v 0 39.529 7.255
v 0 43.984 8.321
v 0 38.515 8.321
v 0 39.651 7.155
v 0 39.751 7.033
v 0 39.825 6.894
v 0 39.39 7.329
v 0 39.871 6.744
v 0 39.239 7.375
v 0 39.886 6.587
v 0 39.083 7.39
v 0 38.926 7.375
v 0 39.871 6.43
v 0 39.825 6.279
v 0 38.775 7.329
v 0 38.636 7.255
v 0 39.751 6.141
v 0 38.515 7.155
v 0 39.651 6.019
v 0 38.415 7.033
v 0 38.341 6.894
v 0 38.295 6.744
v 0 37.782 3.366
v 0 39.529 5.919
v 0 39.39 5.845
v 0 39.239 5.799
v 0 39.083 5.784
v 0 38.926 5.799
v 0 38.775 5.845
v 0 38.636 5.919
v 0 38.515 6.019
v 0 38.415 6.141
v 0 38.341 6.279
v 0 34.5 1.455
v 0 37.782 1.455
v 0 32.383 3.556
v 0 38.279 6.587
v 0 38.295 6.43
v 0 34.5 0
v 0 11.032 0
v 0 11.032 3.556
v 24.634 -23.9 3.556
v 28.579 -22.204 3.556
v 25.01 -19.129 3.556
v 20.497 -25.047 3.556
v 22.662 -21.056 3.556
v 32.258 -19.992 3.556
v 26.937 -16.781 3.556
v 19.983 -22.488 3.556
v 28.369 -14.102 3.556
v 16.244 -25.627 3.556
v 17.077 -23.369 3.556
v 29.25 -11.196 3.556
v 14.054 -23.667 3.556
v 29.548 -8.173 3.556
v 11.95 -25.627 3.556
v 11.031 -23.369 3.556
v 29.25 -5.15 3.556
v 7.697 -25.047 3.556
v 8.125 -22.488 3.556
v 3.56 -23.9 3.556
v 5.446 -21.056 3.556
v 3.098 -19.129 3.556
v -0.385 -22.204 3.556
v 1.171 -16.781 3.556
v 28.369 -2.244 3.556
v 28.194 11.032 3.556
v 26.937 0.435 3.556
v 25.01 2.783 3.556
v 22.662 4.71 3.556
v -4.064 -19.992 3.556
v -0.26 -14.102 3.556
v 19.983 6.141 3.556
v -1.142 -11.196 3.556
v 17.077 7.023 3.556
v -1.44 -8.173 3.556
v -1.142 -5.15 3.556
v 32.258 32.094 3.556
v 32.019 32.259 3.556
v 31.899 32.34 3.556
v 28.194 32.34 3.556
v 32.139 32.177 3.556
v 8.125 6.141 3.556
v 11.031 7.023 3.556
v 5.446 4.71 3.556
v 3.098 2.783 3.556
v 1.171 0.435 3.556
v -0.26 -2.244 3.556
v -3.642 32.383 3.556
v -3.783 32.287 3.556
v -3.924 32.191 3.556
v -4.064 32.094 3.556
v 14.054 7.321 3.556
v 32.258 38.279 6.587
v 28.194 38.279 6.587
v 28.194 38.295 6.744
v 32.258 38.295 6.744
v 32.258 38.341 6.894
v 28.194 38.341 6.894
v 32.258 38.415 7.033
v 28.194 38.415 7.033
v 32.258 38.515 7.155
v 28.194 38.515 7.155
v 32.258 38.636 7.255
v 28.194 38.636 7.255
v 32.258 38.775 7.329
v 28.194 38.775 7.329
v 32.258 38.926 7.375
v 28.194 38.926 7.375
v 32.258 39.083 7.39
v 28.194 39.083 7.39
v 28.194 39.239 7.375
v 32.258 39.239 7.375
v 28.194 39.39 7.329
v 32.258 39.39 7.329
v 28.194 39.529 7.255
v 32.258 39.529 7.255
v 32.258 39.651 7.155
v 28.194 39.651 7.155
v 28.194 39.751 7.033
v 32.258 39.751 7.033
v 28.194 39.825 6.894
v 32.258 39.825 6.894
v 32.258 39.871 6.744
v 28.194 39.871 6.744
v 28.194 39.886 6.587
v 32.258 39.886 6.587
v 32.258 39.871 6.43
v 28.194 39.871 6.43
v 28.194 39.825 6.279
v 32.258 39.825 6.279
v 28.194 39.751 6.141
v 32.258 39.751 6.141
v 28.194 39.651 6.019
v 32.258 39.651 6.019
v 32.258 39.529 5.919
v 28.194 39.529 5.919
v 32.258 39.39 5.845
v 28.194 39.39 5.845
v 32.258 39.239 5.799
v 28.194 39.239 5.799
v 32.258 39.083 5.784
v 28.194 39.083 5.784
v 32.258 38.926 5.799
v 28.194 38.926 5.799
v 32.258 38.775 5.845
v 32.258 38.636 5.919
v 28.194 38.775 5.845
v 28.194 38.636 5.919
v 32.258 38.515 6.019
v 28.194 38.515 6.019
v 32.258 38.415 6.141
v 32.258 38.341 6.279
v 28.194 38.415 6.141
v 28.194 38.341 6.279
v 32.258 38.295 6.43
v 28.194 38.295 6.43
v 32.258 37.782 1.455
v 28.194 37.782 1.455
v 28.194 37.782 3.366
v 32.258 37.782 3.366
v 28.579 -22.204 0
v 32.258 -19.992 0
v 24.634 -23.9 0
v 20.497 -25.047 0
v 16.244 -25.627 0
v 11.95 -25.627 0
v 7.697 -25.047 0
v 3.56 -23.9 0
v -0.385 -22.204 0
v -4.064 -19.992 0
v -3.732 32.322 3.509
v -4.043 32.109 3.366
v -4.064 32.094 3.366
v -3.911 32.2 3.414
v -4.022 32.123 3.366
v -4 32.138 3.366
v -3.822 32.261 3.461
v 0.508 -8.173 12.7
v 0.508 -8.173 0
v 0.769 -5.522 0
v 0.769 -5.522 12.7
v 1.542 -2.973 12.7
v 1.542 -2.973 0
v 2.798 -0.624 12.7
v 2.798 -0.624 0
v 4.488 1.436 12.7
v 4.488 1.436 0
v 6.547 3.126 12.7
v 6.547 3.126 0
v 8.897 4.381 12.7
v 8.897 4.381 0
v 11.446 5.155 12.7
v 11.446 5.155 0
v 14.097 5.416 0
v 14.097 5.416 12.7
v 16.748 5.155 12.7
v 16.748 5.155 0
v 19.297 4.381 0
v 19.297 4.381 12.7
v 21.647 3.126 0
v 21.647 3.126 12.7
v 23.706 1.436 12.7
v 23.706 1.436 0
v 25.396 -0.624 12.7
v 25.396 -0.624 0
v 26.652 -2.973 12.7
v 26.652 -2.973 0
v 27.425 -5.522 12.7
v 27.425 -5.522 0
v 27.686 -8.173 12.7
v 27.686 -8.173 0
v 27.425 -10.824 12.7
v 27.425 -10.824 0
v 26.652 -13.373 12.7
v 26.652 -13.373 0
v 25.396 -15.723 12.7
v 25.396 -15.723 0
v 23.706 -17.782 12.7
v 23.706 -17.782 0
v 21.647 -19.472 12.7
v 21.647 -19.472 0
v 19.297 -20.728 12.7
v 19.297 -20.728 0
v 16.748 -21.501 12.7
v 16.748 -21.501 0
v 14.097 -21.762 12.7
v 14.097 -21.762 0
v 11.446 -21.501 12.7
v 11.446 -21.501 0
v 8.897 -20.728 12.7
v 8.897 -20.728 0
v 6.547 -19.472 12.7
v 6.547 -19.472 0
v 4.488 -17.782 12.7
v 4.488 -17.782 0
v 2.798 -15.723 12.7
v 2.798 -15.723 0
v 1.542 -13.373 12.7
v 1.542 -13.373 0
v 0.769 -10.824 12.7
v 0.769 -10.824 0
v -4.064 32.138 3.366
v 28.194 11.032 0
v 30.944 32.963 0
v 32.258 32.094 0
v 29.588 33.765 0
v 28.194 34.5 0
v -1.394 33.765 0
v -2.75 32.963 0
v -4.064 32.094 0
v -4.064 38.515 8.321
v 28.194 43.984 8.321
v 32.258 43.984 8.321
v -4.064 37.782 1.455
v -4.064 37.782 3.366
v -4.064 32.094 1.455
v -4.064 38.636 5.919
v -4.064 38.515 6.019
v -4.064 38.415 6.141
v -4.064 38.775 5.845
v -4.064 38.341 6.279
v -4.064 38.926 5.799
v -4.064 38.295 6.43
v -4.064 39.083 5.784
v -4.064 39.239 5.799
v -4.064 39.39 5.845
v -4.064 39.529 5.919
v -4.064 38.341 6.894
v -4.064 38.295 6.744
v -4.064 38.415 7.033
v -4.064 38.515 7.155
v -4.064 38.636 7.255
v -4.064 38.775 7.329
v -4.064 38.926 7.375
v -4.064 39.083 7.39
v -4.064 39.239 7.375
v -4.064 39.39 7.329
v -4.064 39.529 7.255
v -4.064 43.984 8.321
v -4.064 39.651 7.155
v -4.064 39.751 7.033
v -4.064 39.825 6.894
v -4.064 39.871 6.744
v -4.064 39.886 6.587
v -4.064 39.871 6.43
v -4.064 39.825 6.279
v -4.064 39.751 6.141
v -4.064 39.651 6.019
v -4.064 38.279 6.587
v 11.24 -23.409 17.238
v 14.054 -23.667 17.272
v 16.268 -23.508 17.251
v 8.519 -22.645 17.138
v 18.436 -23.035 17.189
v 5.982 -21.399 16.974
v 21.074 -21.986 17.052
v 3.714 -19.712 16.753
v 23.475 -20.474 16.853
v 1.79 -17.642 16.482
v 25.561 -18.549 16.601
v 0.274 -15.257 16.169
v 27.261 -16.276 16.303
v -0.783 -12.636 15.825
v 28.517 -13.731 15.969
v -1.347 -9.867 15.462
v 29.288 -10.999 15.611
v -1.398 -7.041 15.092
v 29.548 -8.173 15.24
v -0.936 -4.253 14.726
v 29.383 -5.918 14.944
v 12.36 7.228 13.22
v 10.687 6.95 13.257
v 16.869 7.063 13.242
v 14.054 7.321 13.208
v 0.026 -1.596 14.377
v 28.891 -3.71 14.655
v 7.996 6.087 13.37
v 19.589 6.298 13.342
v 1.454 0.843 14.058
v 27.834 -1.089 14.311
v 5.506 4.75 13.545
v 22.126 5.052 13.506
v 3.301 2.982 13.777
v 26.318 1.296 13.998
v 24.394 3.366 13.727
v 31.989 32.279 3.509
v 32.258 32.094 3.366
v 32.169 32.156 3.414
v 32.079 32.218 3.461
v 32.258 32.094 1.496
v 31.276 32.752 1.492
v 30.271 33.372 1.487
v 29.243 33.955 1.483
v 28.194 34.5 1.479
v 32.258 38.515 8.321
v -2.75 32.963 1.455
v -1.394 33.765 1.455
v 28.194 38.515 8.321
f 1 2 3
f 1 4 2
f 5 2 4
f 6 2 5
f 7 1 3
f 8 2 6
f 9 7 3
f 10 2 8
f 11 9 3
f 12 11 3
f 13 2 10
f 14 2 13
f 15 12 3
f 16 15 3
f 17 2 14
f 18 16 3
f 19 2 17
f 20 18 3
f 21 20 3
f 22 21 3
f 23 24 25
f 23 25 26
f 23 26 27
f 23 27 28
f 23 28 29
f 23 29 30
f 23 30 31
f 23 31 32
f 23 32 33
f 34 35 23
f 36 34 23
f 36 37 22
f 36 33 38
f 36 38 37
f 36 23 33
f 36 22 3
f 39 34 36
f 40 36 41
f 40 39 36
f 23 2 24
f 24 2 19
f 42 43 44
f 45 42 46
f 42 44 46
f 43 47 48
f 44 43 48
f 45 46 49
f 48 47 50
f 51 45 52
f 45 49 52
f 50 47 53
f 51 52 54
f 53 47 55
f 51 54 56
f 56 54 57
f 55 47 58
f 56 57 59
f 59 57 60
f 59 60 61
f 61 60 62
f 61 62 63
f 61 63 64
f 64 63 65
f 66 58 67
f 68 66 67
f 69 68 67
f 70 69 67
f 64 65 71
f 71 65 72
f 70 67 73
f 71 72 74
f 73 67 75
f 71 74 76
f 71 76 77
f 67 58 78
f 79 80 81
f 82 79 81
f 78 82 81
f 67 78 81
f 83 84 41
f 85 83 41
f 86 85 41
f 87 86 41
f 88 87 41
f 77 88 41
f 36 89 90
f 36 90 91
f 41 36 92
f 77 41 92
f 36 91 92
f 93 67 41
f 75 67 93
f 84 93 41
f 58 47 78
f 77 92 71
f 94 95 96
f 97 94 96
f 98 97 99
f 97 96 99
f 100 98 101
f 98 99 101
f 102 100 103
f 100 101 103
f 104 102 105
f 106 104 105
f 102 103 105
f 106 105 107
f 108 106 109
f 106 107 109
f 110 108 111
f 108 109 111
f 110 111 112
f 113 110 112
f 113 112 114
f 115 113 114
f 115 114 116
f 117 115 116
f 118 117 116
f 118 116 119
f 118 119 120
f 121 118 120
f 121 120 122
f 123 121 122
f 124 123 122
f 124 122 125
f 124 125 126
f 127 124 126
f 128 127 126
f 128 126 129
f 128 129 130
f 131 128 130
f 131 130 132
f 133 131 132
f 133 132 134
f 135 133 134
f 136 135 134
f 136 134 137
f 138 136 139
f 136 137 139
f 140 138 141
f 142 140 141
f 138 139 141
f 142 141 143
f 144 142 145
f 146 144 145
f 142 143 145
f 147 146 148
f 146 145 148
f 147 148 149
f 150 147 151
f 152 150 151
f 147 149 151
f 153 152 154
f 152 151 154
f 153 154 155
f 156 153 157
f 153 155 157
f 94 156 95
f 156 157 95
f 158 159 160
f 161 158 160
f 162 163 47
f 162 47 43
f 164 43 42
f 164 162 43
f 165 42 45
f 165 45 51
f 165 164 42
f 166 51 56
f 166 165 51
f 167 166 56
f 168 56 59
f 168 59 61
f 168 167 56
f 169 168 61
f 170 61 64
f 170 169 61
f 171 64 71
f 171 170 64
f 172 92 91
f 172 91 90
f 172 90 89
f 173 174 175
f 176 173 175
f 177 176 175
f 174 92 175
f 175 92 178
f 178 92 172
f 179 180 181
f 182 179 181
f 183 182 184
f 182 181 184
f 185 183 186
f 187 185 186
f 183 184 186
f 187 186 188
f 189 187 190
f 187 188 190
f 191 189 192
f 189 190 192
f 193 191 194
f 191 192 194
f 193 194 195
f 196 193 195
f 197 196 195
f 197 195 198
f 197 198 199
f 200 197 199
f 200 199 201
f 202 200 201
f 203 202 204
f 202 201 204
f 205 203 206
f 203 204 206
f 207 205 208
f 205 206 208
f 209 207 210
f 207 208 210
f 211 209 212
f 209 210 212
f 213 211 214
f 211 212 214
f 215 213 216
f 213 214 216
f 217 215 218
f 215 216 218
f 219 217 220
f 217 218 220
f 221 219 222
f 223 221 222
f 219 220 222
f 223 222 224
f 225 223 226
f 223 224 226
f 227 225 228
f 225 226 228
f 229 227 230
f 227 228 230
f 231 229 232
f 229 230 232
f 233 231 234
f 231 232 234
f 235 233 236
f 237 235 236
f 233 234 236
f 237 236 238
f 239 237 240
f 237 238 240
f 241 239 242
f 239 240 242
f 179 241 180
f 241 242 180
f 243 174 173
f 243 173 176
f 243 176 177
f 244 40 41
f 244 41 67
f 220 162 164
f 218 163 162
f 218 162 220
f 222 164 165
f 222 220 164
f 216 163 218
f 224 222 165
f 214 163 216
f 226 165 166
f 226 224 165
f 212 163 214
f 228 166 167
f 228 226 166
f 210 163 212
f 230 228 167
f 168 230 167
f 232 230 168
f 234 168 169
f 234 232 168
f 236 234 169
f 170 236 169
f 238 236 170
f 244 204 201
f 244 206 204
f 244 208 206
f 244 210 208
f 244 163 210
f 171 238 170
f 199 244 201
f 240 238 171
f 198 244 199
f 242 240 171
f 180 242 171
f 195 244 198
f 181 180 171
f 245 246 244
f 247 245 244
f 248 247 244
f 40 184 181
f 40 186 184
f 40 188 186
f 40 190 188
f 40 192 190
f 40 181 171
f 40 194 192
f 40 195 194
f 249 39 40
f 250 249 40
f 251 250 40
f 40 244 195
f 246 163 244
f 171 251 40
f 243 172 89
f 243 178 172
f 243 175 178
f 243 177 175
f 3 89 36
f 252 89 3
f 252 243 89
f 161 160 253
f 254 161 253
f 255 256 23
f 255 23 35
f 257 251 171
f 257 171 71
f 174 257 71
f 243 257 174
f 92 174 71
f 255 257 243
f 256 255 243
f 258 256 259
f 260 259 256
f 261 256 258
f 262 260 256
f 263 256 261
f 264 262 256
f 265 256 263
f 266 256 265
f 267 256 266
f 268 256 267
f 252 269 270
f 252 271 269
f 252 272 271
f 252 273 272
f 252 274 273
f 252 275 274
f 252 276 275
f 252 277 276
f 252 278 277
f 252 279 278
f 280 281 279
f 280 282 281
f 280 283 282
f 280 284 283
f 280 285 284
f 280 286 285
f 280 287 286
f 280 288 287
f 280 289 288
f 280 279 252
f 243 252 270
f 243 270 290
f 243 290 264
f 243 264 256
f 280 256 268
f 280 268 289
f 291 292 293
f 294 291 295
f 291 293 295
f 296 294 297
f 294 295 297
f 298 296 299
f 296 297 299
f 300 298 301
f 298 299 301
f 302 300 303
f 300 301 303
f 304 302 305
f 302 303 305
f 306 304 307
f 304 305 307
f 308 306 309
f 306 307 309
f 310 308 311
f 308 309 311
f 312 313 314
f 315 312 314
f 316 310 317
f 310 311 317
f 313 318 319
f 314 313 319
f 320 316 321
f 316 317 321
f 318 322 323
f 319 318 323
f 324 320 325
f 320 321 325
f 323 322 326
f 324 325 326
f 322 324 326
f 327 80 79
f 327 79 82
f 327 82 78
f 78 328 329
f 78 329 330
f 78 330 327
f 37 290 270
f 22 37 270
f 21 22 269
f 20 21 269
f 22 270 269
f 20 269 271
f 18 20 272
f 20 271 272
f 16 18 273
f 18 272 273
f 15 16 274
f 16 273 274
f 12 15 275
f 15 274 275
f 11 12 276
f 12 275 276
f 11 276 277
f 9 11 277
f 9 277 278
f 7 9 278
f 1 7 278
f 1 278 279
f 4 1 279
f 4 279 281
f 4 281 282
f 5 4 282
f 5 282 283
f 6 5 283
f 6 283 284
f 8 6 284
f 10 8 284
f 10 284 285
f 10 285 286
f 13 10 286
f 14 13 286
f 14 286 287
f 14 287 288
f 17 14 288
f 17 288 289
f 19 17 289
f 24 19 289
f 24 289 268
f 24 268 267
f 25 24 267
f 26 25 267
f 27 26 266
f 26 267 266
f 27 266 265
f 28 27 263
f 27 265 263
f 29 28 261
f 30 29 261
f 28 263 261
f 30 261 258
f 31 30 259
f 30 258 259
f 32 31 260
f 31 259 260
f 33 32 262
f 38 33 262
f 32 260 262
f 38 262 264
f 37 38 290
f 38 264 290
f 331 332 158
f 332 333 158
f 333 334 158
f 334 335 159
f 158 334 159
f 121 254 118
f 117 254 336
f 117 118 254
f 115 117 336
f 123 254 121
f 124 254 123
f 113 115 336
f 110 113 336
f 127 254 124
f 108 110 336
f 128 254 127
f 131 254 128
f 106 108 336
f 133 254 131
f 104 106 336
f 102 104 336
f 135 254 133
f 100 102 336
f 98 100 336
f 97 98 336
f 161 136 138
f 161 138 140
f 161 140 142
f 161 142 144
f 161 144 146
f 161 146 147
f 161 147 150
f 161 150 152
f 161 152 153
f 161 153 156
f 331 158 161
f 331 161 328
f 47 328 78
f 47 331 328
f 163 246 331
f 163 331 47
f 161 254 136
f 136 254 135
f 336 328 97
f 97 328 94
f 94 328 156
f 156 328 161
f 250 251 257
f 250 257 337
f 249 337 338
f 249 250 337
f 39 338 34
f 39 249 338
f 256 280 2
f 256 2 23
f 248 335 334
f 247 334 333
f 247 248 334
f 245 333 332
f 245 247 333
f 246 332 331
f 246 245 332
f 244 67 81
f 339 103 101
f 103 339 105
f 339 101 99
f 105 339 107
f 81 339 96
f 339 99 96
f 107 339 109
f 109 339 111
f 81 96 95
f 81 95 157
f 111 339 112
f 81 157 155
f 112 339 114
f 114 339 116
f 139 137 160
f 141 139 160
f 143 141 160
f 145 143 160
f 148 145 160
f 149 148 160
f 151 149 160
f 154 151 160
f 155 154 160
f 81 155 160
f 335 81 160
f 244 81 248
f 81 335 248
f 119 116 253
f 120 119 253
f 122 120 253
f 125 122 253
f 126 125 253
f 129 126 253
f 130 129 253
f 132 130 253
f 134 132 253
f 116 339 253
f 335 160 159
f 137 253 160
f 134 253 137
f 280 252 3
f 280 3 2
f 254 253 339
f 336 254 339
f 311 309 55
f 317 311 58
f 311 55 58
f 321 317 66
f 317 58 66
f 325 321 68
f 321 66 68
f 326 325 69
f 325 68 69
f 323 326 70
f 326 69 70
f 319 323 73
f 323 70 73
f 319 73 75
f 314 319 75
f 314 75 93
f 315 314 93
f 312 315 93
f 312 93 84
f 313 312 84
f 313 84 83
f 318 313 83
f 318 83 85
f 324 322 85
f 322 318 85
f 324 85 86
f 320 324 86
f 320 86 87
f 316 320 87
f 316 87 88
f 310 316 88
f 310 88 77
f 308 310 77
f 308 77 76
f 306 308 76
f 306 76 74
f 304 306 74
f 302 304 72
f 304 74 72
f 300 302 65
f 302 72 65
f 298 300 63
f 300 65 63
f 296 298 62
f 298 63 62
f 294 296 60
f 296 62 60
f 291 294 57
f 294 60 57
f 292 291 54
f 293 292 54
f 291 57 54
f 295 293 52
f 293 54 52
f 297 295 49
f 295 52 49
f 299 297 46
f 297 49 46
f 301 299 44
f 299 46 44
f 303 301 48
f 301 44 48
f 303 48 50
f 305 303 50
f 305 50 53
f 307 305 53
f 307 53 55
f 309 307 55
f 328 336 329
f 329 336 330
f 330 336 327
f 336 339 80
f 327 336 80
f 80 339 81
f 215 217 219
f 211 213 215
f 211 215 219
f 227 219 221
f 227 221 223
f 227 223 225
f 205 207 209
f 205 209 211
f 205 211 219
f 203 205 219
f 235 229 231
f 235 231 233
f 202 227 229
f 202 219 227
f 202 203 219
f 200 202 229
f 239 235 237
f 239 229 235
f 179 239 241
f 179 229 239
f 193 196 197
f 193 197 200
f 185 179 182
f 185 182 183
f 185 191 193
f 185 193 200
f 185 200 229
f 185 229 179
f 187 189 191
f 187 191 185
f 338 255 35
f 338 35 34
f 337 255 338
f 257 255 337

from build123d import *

# Parameters (mm, degrees)
LID_PROFILE_DEPTH           = 3.556
SKETCH2_R                   = 15.494
MOUTHPIECE_COVER_DEPTH      = 13.716
SKETCH5_R                   = 13.589
MOUTHPIECE_INSIDE_DEPTH     = 12.7
MOUTHPIECE_ANGLED_CUT_DEPTH = 31.75
LEFT_LID_HANDLE_REACH       = 54.989
RIGHT_LID_HANDLE_REACH      = 59.215
CUT_EXTRUDE1_REACH          = 61.6
SKETCH15_R                  = 0.803296428


with BuildPart() as part:
    # Sketch1 → Lid Profile (new body)
    with BuildSketch(Plane.XY):
        with BuildLine():
            Line((0, 34.499663168), (0, 21.545663168))
            Line((0, 21.545663168), (0, 11.032242365))
            Line((0, 11.032242365), (28.194, 11.032242365))
            Line((28.194, 11.032242365), (28.194, 21.545663168))
            Line((28.194, 21.545663168), (28.194, 34.499663168))
            ThreePointArc((28.194, 34.499663168), (30.270793835, 33.37243225), (32.258, 32.093865147))
            Line((32.258, 32.093865147), (32.258, -19.992239679))
            ThreePointArc((32.258, -19.992239679), (14.097, -25.699187266), (-4.064, -19.992239679))
            Line((-4.064, -19.992239679), (-4.064, 32.093865147))
            ThreePointArc((-4.064, 32.093865147), (-2.076793835, 33.37243225), (0, 34.499663168))
        make_face()
    extrude(amount=LID_PROFILE_DEPTH)

    # Sketch2 → Mouthpiece Cover (add)
    with BuildSketch(Plane.XY.offset(3.556)):
        with Locations((14.054185991, -8.173187266)):
            Circle(SKETCH2_R)
    extrude(amount=MOUTHPIECE_COVER_DEPTH)

    # Sketch5 → Mouthpiece Inside (cut)
    with BuildSketch(Plane(origin=(0, 0, 0), x_dir=(-1, 0, 0), z_dir=(0, 0, -1))):
        with Locations((-14.097, -8.173187266)):
            Circle(SKETCH5_R)
    extrude(amount=-MOUTHPIECE_INSIDE_DEPTH, mode=Mode.SUBTRACT)

    # Sketch12 → Mouthpiece Angled Cut (cut, symmetric)
    with BuildSketch(Plane(origin=(0, 0, 0), x_dir=(0, 0, -1), z_dir=(1, 0, 0))):
        Polygon((-17.272, -23.667187266), (-13.208, 7.320812734), (-17.272, 7.320812734), align=None)
    extrude(amount=MOUTHPIECE_ANGLED_CUT_DEPTH, both=True, mode=Mode.SUBTRACT)

    # Left Lid Handle: up to this face of the body (flat: up to its plane)
    left_lid_handle_end = Plane(part.part.faces().sort_by_distance((0, 22.765952767, 1.778))[0])
    # Sketch10 → Left Lid Handle (add, up to the picked face)
    with BuildSketch(Plane.ZY.offset(4.064), mode=Mode.PRIVATE) as left_lid_handle_sk1:
        Polygon((3.365795212, 32.138217174), (8.321348051, 38.515411016), (8.321348051, 43.984174588), (3.365795212, 37.782280768), (1.455115312, 37.782280768), (1.455115312, 28.897562955), (3.365795212, 28.897562955), align=None)
    left_lid_handle_tool1 = split(extrude(left_lid_handle_sk1.sketch, amount=-LEFT_LID_HANDLE_REACH, mode=Mode.PRIVATE), bisect_by=left_lid_handle_end, keep=Keep.BOTH, mode=Mode.PRIVATE)
    add(left_lid_handle_tool1.solids().sort_by(Axis((-4.064, 36.27745, 4.52617), (1, 0, 0)))[0])

    # Right Lid Handle: up to this face of the body (flat: up to its plane)
    right_lid_handle_end = Plane(part.part.faces().sort_by_distance((32.258, 6.050812734, 1.778))[0])
    # Sketch14 → Right Lid Handle (add, up to the picked face)
    with BuildSketch(Plane.ZY.offset(-28.194), mode=Mode.PRIVATE) as right_lid_handle_sk1:
        Polygon((8.321348051, 43.984174588), (8.321348051, 38.515411016), (3.365795212, 32.093865147), (3.302, 26.626354669), (1.53624021, 26.626354669), (1.455115312, 37.782280768), (3.365795212, 37.782280768), align=None)
    right_lid_handle_tool1 = split(extrude(right_lid_handle_sk1.sketch, amount=-RIGHT_LID_HANDLE_REACH, mode=Mode.PRIVATE), bisect_by=right_lid_handle_end, keep=Keep.BOTH, mode=Mode.PRIVATE)
    add(right_lid_handle_tool1.solids().sort_by(Axis((28.194, 35.592076, 4.370093), (1, 0, 0)))[0])

    # Cut-Extrude1: up to this face of the body (flat: up to its plane)
    cut_extrude1_end = Plane(part.part.faces().sort_by_distance((32.258, 11.399042149, 2.309511507))[0])
    # Sketch15 → Cut-Extrude1 (cut, up to the picked face)
    with BuildSketch(Plane.ZY.offset(4.064), mode=Mode.PRIVATE) as cut_extrude1_sk1:
        with Locations(Location((6.586858653, 39.082697022, 0), (0, 0, 270))):
            Circle(SKETCH15_R)
    cut_extrude1_tool1 = split(extrude(cut_extrude1_sk1.sketch, amount=-CUT_EXTRUDE1_REACH, mode=Mode.PRIVATE), bisect_by=cut_extrude1_end, keep=Keep.BOTH, mode=Mode.PRIVATE)
    add(cut_extrude1_tool1.solids().sort_by(Axis((-4.064, 39.082697, 6.586859), (1, 0, 0)))[0], mode=Mode.SUBTRACT)


solid = part.part
